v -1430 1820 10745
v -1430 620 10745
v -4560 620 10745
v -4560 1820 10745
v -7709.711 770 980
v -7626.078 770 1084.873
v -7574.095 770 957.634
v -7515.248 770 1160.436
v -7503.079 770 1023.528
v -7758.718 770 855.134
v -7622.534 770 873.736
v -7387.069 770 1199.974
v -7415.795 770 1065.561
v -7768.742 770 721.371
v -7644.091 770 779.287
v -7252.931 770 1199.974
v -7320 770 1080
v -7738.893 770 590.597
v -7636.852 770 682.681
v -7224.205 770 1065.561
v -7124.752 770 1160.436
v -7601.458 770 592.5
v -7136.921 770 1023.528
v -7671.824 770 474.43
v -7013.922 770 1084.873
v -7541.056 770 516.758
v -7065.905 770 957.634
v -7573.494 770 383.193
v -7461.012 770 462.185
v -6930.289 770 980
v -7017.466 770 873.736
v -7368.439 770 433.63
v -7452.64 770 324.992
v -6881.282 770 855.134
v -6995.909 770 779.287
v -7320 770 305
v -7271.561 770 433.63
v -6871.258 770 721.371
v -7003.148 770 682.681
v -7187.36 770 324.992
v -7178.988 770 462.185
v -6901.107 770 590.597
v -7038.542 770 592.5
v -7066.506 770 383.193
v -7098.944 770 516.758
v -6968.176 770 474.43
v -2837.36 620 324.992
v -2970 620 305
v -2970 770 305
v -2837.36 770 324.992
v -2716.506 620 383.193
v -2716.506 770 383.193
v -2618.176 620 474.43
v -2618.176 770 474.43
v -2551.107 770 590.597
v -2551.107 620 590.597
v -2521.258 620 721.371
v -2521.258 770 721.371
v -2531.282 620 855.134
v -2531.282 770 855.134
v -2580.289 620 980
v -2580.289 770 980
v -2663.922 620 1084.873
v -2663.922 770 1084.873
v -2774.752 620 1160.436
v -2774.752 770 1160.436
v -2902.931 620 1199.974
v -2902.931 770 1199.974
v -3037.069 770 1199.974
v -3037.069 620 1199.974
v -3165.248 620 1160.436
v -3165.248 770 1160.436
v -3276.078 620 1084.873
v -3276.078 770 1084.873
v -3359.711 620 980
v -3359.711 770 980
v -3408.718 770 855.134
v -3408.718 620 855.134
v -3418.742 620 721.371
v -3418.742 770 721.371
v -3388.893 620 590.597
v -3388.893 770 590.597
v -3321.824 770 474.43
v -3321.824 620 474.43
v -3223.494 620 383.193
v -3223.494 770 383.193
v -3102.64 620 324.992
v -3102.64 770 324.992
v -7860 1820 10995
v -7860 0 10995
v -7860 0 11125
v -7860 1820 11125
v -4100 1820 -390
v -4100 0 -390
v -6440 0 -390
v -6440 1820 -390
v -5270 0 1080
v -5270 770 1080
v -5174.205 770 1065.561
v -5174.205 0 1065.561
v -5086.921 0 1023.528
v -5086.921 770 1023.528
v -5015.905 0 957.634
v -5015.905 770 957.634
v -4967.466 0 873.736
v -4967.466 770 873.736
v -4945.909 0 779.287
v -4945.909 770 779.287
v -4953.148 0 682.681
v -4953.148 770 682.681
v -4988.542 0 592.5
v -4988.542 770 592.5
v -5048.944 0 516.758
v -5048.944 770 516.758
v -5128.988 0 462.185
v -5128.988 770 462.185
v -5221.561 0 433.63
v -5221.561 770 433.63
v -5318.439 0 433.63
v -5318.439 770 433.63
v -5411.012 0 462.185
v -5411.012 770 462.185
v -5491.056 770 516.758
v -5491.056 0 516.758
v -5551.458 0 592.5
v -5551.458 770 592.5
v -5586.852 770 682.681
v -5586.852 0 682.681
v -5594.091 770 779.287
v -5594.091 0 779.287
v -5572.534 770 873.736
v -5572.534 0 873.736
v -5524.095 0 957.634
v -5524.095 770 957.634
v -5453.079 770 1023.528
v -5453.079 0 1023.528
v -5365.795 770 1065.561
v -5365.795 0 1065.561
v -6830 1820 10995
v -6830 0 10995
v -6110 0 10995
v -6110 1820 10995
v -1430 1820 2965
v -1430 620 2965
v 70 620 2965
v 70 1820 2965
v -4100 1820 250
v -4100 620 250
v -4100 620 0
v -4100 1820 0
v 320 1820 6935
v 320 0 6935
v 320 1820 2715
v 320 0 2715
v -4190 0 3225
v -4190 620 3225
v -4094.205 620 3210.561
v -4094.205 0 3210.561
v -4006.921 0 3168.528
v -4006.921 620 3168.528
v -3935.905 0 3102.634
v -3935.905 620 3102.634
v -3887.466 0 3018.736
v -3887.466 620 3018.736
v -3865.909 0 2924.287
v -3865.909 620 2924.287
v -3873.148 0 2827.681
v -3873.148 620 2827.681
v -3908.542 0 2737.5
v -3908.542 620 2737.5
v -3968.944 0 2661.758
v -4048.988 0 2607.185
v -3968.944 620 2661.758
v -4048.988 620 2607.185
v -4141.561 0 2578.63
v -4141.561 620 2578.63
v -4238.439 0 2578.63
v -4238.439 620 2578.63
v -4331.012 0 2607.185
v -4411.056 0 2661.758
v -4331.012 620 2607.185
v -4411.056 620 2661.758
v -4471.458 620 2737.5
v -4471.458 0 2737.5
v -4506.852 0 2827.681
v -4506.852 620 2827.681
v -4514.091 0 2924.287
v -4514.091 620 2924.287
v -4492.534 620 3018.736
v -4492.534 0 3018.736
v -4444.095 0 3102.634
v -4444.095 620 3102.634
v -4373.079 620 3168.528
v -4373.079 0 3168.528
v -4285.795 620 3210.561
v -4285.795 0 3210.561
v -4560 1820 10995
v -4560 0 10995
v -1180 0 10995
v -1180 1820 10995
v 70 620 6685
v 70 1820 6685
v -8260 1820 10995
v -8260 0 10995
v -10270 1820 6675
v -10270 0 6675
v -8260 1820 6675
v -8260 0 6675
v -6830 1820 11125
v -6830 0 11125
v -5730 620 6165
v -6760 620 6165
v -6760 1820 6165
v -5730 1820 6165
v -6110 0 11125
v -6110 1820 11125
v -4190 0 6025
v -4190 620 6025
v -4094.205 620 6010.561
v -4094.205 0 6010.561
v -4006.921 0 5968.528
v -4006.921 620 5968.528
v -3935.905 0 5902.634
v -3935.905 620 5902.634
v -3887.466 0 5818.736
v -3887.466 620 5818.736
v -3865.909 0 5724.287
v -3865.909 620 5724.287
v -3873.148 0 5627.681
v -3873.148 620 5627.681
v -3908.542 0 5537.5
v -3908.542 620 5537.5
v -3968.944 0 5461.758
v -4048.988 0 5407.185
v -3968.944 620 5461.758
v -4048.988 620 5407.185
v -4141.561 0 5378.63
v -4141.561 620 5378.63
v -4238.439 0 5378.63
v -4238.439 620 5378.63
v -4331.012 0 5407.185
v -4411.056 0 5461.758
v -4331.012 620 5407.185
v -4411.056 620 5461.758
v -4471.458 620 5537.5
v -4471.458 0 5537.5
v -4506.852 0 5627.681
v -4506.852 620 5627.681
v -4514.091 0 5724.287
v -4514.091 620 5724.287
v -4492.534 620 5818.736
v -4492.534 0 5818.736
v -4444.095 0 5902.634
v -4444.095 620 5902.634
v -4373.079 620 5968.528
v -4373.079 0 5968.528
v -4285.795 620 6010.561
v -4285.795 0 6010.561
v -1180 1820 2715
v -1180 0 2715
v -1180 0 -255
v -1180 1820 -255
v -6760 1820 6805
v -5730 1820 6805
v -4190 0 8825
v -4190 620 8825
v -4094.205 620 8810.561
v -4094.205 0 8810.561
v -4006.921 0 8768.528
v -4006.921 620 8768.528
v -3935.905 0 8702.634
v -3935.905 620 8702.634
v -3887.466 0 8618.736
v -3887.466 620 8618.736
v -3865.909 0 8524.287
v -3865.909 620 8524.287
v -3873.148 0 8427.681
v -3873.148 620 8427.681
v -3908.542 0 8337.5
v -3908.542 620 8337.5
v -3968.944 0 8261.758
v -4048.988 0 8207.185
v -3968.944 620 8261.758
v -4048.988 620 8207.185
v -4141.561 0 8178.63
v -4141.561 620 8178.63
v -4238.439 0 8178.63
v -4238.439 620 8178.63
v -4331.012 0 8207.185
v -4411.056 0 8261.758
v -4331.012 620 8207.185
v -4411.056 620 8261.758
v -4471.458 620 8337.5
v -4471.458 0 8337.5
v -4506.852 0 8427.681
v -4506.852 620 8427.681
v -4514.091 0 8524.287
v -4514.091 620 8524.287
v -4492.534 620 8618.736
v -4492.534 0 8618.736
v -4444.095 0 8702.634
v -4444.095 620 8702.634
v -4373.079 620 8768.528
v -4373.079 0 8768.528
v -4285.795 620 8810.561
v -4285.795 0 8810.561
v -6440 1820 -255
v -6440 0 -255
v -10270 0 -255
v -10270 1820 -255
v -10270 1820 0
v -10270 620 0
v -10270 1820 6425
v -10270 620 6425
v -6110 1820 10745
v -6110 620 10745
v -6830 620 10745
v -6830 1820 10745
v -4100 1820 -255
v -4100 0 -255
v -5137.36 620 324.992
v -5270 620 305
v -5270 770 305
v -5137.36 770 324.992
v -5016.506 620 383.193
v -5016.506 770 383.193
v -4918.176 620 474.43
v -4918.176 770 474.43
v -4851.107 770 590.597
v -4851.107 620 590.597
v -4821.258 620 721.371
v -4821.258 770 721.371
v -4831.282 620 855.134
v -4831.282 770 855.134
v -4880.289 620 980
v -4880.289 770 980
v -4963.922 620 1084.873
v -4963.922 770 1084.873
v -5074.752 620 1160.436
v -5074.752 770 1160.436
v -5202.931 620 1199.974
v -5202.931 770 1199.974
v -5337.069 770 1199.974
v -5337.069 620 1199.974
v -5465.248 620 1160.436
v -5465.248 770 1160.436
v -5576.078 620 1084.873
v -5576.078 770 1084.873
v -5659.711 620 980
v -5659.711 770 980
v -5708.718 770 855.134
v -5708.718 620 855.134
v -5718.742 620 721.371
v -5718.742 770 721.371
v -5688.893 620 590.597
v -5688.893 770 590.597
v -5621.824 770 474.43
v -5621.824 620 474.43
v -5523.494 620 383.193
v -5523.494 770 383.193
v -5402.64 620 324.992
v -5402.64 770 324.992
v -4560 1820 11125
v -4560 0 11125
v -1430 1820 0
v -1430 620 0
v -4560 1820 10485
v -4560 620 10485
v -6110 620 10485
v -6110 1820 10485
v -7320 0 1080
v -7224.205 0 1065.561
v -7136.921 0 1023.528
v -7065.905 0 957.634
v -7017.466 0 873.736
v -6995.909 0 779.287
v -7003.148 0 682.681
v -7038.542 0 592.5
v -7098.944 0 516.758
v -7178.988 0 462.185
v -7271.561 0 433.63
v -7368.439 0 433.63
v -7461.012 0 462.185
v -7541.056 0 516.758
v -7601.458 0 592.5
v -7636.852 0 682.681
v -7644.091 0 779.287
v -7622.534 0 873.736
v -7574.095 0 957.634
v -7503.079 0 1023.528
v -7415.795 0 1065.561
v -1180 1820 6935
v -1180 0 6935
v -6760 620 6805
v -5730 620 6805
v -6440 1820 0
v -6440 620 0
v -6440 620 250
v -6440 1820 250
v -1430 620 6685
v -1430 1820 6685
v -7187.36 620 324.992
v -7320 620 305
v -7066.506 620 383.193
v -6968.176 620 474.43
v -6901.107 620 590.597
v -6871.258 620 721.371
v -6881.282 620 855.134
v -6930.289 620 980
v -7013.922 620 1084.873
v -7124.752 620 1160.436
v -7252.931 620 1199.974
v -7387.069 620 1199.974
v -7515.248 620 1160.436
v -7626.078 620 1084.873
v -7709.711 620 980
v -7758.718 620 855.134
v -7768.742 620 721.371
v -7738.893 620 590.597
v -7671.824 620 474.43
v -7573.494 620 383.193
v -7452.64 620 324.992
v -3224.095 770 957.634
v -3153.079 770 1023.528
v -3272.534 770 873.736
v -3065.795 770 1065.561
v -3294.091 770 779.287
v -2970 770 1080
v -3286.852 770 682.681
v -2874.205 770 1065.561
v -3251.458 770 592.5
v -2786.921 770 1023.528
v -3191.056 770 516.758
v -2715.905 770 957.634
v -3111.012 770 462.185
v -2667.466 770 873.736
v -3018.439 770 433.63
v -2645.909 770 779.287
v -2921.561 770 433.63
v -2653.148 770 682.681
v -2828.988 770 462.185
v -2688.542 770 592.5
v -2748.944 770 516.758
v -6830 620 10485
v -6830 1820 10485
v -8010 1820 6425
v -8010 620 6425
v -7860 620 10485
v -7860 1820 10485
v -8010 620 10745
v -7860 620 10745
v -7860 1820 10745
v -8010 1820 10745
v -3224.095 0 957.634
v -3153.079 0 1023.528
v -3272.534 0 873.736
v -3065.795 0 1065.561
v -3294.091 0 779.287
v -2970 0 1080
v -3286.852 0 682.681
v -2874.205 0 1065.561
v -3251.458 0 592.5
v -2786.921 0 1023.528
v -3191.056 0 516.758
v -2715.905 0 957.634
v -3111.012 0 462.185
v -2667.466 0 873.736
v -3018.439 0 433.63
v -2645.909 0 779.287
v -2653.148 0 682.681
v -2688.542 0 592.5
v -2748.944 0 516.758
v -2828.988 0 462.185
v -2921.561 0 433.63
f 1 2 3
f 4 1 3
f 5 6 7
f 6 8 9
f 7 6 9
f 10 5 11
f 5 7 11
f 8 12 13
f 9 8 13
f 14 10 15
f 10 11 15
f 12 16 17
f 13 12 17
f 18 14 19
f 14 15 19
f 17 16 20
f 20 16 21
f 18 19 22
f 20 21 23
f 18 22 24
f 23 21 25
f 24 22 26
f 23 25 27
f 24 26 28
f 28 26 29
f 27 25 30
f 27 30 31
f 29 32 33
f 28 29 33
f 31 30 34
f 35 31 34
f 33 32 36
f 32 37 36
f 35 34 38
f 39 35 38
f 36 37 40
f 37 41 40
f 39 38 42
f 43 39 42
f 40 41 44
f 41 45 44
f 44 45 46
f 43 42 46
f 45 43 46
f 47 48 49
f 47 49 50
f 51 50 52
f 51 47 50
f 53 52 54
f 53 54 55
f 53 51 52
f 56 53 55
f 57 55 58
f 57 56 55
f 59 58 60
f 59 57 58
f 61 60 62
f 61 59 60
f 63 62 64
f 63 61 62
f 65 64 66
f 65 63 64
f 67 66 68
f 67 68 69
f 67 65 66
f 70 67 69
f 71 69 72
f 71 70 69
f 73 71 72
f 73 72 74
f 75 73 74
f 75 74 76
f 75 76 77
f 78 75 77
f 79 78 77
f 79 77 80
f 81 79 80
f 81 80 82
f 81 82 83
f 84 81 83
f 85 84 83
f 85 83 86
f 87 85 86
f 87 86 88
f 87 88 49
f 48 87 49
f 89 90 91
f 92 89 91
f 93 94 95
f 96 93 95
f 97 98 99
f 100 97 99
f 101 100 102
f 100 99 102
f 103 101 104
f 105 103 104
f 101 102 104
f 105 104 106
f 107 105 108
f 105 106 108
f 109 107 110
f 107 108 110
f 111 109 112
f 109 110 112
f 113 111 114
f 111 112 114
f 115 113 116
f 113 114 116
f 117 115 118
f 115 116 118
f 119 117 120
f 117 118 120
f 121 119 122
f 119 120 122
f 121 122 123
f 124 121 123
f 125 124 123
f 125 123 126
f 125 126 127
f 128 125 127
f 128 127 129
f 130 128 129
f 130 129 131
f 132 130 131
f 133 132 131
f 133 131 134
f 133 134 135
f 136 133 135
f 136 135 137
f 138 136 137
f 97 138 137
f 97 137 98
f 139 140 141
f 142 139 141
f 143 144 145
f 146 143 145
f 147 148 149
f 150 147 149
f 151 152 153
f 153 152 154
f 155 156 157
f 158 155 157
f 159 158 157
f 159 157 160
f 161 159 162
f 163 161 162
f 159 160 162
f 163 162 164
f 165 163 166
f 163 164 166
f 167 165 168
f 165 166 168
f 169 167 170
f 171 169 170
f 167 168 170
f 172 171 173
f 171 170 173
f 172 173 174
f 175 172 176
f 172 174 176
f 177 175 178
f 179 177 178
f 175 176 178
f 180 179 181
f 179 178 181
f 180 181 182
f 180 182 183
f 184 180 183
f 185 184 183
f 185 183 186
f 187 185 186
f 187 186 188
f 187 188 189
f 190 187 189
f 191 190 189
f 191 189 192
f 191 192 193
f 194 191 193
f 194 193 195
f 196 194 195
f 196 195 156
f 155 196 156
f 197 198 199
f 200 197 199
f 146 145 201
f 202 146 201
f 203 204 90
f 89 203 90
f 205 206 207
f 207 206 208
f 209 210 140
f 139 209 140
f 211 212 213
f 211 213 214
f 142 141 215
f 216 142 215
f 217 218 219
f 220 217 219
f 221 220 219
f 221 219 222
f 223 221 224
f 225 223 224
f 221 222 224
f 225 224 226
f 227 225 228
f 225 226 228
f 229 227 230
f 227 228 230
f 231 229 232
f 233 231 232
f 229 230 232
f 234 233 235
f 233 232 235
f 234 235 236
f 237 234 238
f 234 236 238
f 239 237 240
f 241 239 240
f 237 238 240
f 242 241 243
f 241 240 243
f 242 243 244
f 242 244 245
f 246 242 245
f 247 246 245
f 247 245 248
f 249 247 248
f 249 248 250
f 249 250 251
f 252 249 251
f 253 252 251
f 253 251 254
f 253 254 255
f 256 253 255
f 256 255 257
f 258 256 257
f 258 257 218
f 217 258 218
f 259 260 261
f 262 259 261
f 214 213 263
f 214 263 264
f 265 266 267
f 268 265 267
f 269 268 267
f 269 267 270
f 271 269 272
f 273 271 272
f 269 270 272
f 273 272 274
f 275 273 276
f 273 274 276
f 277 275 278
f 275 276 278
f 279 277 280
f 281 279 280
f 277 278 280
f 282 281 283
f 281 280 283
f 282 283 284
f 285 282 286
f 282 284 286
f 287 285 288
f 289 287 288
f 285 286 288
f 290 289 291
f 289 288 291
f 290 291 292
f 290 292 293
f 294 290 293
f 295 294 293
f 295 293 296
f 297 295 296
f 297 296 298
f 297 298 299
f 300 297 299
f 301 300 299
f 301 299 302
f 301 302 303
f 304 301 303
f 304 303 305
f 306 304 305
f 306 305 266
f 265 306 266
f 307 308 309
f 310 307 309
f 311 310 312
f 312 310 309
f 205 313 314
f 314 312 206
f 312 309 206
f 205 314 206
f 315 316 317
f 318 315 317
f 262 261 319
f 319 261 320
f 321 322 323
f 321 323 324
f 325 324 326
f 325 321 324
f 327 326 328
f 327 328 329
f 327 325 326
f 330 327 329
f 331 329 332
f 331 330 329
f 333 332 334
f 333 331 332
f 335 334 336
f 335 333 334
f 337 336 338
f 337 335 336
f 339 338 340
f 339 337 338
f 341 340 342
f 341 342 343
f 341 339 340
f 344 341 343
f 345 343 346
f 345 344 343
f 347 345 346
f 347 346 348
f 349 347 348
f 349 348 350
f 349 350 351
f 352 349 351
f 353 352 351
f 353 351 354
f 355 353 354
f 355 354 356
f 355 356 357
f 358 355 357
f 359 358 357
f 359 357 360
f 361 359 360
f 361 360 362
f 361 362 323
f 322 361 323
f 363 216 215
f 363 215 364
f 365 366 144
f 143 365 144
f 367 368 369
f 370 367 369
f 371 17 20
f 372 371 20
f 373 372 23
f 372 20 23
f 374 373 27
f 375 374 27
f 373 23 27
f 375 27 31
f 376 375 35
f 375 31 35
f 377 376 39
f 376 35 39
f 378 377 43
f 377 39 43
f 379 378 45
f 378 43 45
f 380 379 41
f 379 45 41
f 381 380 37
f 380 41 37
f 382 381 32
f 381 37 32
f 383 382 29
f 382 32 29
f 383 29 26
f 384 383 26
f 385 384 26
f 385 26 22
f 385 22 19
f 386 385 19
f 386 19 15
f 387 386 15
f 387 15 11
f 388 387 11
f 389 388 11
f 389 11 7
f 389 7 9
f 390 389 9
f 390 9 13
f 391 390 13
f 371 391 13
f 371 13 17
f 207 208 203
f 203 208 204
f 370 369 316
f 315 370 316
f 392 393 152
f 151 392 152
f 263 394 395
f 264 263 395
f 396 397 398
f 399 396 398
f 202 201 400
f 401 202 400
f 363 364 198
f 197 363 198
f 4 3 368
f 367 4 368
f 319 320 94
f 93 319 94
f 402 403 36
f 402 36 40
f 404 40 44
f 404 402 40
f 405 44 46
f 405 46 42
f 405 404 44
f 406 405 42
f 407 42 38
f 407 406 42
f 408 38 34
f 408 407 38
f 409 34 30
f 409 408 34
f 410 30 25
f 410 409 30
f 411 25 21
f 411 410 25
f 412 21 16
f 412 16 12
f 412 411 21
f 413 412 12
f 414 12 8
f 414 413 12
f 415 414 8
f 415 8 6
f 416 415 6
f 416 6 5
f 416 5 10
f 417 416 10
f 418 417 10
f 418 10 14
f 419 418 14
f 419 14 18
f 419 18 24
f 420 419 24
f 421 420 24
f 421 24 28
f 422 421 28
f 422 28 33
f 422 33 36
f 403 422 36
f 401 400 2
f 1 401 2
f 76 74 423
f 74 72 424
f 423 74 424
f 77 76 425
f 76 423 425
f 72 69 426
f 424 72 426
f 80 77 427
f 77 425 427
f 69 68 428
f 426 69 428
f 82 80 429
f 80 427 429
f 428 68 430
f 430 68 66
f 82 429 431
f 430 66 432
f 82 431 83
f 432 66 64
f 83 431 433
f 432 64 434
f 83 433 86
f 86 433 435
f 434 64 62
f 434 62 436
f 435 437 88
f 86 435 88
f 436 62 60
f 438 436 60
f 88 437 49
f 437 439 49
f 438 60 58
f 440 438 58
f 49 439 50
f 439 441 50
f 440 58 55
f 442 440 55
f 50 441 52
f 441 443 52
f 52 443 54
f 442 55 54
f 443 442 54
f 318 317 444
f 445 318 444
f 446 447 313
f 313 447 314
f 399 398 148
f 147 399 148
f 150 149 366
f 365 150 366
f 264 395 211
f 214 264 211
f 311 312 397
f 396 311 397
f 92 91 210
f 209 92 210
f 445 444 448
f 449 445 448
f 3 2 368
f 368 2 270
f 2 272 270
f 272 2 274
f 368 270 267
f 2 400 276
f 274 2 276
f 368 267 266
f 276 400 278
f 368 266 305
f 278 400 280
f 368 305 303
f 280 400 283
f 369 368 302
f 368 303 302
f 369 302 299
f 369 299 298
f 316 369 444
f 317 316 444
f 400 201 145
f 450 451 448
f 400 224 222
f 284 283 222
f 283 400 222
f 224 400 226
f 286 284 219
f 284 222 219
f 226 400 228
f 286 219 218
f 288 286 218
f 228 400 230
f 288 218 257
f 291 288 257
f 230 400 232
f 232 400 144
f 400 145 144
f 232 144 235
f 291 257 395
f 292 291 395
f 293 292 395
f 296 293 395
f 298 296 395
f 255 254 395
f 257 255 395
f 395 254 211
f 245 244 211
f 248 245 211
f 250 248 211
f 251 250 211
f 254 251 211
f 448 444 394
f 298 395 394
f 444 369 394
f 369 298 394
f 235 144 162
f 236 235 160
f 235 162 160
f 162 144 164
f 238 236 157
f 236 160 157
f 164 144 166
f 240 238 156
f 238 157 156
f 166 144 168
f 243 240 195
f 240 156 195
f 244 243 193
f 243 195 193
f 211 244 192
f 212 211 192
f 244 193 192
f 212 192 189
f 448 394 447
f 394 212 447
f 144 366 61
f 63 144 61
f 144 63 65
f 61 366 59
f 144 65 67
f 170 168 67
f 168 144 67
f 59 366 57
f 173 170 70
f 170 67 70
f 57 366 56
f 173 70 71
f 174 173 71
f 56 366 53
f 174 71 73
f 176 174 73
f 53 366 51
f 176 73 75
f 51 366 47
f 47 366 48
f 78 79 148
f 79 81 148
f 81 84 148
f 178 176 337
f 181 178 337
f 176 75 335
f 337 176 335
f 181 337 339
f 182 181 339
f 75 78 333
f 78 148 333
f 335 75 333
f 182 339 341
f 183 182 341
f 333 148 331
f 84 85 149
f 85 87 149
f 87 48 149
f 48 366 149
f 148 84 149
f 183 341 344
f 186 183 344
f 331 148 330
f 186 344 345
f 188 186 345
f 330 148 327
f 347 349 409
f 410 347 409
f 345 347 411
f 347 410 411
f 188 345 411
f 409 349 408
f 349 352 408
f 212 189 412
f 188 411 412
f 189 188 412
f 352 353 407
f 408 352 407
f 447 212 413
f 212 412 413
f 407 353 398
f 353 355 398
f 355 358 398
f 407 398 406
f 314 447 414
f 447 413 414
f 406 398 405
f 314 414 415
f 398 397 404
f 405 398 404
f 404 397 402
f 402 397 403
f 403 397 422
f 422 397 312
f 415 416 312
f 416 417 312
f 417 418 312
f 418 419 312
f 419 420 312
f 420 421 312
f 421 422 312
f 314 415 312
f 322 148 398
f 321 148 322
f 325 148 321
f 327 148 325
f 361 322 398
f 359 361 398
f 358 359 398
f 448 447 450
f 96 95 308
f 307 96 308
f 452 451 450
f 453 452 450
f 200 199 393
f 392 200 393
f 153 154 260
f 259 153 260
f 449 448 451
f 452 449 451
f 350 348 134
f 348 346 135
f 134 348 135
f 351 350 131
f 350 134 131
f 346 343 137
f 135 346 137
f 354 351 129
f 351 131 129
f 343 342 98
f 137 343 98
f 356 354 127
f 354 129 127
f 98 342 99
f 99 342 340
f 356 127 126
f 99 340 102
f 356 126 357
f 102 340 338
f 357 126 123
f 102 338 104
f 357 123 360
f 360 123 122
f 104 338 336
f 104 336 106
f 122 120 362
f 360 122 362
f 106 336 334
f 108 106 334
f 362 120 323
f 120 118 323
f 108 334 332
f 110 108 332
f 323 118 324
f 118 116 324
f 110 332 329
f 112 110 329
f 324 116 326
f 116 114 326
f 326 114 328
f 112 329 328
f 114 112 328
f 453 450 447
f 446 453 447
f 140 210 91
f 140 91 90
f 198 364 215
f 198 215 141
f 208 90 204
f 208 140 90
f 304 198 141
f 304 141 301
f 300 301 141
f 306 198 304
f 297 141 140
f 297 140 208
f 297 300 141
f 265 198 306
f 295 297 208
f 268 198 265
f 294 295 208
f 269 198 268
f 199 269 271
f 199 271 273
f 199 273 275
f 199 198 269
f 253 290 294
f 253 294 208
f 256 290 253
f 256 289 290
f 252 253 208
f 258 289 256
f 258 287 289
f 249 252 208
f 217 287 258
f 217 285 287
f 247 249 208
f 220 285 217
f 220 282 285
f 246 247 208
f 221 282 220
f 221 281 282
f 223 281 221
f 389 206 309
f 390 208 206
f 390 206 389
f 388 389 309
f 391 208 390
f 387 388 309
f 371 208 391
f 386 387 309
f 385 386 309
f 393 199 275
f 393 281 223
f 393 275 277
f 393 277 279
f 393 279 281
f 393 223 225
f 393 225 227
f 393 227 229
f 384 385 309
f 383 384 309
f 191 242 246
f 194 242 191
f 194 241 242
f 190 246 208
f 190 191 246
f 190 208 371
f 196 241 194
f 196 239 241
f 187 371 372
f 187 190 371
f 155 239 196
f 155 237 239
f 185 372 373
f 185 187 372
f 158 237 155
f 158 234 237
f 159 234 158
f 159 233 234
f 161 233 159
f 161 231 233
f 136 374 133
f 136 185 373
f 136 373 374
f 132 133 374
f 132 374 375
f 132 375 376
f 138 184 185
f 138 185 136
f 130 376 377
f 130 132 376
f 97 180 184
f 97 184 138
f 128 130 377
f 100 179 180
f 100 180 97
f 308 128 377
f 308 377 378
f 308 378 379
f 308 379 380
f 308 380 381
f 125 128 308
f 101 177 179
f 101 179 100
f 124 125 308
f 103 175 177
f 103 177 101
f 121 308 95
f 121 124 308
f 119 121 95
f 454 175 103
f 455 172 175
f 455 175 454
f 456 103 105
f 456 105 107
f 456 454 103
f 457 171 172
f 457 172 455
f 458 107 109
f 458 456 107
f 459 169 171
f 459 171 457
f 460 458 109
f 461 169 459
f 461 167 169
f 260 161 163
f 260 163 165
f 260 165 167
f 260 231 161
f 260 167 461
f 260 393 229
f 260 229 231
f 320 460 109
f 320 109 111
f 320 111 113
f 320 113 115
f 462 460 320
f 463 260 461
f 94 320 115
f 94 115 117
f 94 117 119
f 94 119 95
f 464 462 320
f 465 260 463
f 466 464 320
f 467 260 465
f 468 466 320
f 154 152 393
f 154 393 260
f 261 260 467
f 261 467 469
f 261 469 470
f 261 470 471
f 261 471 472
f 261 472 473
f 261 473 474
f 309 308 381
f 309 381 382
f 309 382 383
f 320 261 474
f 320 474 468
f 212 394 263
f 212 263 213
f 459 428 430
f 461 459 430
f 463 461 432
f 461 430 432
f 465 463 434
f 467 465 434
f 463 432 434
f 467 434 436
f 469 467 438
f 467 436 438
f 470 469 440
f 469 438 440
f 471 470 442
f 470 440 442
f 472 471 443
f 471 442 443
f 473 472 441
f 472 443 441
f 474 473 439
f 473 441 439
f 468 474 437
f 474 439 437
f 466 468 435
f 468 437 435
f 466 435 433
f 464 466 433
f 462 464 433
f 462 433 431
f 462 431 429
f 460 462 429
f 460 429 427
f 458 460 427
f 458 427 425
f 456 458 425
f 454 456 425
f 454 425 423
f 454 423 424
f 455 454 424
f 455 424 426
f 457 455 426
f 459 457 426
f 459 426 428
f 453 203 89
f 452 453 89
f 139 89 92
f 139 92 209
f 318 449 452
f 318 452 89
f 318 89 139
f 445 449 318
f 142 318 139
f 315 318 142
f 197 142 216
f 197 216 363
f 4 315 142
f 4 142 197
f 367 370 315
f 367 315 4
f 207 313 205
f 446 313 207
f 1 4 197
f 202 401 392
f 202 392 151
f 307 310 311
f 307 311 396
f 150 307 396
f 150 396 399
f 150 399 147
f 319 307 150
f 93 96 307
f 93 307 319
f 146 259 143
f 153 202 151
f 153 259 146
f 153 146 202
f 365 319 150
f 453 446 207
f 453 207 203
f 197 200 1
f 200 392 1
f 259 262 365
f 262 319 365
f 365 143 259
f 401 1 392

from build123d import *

# Parameters (mm, degrees)
SKETCH_1_W          = 1030
SKETCH_1_H          = 640
EXTRUDE_1_DEPTH     = 1820
EXTRUDE_2_DEPTH     = 620
SKETCH_5_R          = 450
EXTRUDE_4_DEPTH     = 770
SKETCH_6_R          = 325
CUT_EXTRUDE_1_DEPTH = 15177.989984842
SKETCH_7_R          = 325
CUT_EXTRUDE_2_DEPTH = 15189.104720471


with BuildPart() as part:
    # Эскиз1 → Бобышка-Вытянуть1 (new body)
    with BuildSketch(Plane(origin=(0, 0, 0), x_dir=(1, 0, 0), z_dir=(0, 1, 0))):
        Polygon((-8010, -10745), (-8010, -6716.192685759), (-8010, -6425), (-10270, -6425), (-10270, -6675), (-8260, -6675), (-8260, -10995), (-7860, -10995), (-7860, -11125), (-6830, -11125), (-6830, -10995), (-6110, -10995), (-6110, -11125), (-4560, -11125), (-4560, -10995), (-1180, -10995), (-1180, -6935), (320, -6935), (320, -2715), (-1180, -2715), (-1180, 255), (-4100, 255), (-4100, 390), (-6440, 390), (-6440, 255), (-10270, 255), (-10270, 0), (-6440, 0), (-6440, -250), (-4100, -250), (-4100, 0), (-1430, 0), (-1430, -2965), (70, -2965), (70, -6685), (-1430, -6685), (-1430, -10745), (-4560, -10745), (-4560, -10485), (-6110, -10485), (-6110, -10745), (-6830, -10745), (-6830, -10485), (-7860, -10485), (-7860, -10745), align=None)
        with Locations((-6245, -6485)):
            Rectangle(SKETCH_1_W, SKETCH_1_H)
    extrude(amount=EXTRUDE_1_DEPTH)

    # Эскиз3 → Бобышка-Вытянуть2 (add)
    with BuildSketch(Plane(origin=(0, 0, 0), x_dir=(1, 0, 0), z_dir=(0, 1, 0))):
        Polygon((-8260, -6675), (-10270, -6675), (-10270, 255), (-1180, 255), (-1180, -2715), (320, -2715), (320, -6935), (-1180, -6935), (-1180, -10995), (-8260, -10995), align=None)
    extrude(amount=EXTRUDE_2_DEPTH)

    # Эскиз5 → Бобышка-Вытянуть4 (add)
    with BuildSketch(Plane.XZ):
        with Locations(Location((-2970, 755, 0), (0, 0, 270))):
            Circle(SKETCH_5_R)
        with Locations(Location((-5270, 755, 0), (0, 0, 270))):
            Circle(SKETCH_5_R)
        with Locations(Location((-7320, 755, 0), (0, 0, 270))):
            Circle(SKETCH_5_R)
    extrude(amount=-EXTRUDE_4_DEPTH)

    # Эскиз6 → Вырез-Вытянуть1 (cut, through all)
    with BuildSketch(Plane(origin=(0, 770, 0), x_dir=(1, 0, 0), z_dir=(0, 1, 0))):
        with Locations(Location((-7320, -755, 0), (0, 0, 270))):
            Circle(SKETCH_6_R)
        with Locations(Location((-5270, -755, 0), (0, 0, 270))):
            Circle(SKETCH_6_R)
        with Locations(Location((-2970, -755, 0), (0, 0, 270))):
            Circle(SKETCH_6_R)
    extrude(amount=-CUT_EXTRUDE_1_DEPTH, mode=Mode.SUBTRACT)

    # Эскиз7 → Вырез-Вытянуть2 (cut, through all)
    with BuildSketch(Plane(origin=(0, 620, 0), x_dir=(1, 0, 0), z_dir=(0, 1, 0))):
        with Locations(Location((-4190, -2900, 0), (0, 0, 270))):
            Circle(SKETCH_7_R)
        with Locations(Location((-4190, -5700, 0), (0, 0, 270))):
            Circle(SKETCH_7_R)
        with Locations(Location((-4190, -8500, 0), (0, 0, 270))):
            Circle(SKETCH_7_R)
    extrude(amount=-CUT_EXTRUDE_2_DEPTH, mode=Mode.SUBTRACT)


solid = part.part
